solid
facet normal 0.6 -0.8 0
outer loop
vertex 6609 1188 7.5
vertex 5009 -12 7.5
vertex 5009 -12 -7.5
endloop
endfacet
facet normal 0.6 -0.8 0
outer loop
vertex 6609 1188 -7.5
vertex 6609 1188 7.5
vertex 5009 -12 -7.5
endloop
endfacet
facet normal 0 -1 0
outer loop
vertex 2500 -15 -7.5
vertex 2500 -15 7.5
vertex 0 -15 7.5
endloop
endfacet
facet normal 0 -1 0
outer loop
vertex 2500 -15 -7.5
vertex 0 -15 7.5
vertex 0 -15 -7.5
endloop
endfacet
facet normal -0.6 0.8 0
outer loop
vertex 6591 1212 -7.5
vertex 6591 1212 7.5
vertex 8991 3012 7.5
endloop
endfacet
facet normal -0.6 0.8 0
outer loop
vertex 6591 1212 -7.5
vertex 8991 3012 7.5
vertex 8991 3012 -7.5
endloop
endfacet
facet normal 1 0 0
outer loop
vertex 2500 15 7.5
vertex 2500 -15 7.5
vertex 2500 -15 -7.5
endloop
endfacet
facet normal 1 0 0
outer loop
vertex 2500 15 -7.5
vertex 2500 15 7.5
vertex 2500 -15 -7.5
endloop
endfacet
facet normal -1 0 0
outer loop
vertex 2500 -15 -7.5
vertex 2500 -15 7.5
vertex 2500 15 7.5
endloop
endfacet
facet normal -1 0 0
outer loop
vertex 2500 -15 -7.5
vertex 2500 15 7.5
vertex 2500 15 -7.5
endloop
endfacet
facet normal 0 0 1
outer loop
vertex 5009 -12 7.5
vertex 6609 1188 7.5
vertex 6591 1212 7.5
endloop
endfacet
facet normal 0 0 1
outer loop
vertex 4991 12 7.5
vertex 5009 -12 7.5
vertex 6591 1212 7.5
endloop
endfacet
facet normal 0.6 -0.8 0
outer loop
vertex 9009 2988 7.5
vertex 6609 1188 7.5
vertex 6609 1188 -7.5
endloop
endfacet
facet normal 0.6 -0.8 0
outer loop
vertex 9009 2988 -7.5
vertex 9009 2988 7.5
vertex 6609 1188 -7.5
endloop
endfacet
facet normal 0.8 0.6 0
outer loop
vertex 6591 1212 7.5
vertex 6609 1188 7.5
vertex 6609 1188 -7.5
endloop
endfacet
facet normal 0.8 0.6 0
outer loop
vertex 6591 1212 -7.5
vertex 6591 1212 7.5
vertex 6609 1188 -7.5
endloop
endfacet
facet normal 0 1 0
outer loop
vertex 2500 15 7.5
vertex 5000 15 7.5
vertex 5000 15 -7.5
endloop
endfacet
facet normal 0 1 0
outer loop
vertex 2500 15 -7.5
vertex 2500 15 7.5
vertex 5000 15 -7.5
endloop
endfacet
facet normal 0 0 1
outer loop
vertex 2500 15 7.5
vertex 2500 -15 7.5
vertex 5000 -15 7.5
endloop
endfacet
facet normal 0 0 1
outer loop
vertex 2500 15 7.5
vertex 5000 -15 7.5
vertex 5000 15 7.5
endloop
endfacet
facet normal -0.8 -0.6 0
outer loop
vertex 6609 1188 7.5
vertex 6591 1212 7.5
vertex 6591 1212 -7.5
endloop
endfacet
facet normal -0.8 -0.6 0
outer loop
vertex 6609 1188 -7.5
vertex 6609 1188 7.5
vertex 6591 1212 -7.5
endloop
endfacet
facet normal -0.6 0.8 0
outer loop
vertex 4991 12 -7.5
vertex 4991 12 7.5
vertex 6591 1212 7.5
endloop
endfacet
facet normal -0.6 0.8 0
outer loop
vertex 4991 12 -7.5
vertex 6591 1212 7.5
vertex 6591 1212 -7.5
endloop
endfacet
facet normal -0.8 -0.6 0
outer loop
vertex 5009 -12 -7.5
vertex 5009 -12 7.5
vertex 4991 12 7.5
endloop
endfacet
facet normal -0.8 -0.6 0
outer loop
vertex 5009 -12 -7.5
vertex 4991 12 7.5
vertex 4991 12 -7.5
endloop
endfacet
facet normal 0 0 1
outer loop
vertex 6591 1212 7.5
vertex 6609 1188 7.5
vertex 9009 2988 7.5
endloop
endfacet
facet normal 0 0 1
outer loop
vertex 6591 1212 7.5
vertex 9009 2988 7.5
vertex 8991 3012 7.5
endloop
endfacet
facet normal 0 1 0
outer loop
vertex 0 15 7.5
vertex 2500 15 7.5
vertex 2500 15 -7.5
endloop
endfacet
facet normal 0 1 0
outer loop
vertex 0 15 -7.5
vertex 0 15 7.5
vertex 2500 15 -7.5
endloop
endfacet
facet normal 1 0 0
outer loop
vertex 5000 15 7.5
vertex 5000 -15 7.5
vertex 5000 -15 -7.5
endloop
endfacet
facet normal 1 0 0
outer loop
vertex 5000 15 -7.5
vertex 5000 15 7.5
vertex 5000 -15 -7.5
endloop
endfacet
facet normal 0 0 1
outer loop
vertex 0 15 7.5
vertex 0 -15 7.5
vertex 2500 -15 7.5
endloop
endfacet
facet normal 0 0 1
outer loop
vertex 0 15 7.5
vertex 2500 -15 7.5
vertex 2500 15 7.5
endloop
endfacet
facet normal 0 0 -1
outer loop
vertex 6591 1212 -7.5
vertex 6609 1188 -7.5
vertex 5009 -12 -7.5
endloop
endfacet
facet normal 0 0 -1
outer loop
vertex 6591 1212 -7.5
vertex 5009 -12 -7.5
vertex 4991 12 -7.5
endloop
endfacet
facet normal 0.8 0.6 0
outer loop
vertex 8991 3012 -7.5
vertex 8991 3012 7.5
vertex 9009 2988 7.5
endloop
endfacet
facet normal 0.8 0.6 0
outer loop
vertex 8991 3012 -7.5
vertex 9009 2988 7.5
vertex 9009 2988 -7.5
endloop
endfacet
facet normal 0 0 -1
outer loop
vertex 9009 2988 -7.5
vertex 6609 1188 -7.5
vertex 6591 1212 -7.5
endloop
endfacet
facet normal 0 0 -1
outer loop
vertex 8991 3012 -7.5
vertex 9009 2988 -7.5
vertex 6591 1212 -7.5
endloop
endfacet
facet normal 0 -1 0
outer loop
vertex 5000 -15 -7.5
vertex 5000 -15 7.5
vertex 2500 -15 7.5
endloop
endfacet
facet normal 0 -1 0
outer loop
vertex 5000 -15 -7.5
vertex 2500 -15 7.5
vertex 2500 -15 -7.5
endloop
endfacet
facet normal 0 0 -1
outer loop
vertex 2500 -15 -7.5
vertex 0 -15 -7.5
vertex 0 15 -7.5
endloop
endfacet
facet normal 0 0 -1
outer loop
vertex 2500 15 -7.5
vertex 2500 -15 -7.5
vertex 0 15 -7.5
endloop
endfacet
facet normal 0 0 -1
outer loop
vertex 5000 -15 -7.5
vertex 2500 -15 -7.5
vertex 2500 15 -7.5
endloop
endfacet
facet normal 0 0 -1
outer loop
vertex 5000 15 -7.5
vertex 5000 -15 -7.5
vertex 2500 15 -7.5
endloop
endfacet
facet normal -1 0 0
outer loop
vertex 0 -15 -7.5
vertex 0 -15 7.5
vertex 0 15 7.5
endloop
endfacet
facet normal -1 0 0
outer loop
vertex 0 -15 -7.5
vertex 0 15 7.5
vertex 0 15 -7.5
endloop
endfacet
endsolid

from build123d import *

# Parameters (mm, degrees)
SKETCH2_W            = 15
SKETCH2_H            = 30
BOSS_EXTRUDE1_DEPTH  = 2500
BOSS_EXTRUDE9_START  = 2500
SKETCH2_11_W         = 15
SKETCH2_11_H         = 30
BOSS_EXTRUDE9_DEPTH  = 2500
SKETCH3_W            = 15
SKETCH3_H            = 30
BOSS_EXTRUDE8_DEPTH  = 2000
BOSS_EXTRUDE10_START = 2000
SKETCH3_2_W          = 15
SKETCH3_2_H          = 30
BOSS_EXTRUDE10_DEPTH = 3000


with BuildPart() as part:
    # Sketch2 → Boss-Extrude1 (new body)
    with BuildSketch(Plane(origin=(0, 0, 0), x_dir=(0, 0, -1), z_dir=(1, 0, 0))):
        Rectangle(SKETCH2_W, SKETCH2_H)
    extrude(amount=BOSS_EXTRUDE1_DEPTH)


with BuildPart() as body_2:
    # Sketch2<11> → Boss-Extrude9 (new body)
    with BuildSketch(Plane(origin=(0, 0, 0), x_dir=(0, 0, -1), z_dir=(1, 0, 0)).offset(BOSS_EXTRUDE9_START)):
        Rectangle(SKETCH2_11_W, SKETCH2_11_H)
    extrude(amount=BOSS_EXTRUDE9_DEPTH)


with BuildPart() as body_3:
    # Sketch3 → Boss-Extrude8 (new body)
    with BuildSketch(Plane(origin=(5000, 0, 0), x_dir=(0, 0, -1), z_dir=(0.8, 0.6, 0))):
        Rectangle(SKETCH3_W, SKETCH3_H)
    extrude(amount=BOSS_EXTRUDE8_DEPTH)


with BuildPart() as body_4:
    # Sketch3<2> → Boss-Extrude10 (new body)
    with BuildSketch(Plane(origin=(5000, 0, 0), x_dir=(0, 0, -1), z_dir=(0.8, 0.6, 0)).offset(BOSS_EXTRUDE10_START)):
        Rectangle(SKETCH3_2_W, SKETCH3_2_H)
    extrude(amount=BOSS_EXTRUDE10_DEPTH)


solid = Compound([part.part, body_2.part, body_3.part, body_4.part])
